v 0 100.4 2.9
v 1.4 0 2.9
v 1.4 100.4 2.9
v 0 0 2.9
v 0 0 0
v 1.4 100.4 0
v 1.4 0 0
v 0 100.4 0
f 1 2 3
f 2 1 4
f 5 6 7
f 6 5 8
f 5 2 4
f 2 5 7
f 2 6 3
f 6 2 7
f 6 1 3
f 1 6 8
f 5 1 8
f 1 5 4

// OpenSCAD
function ZipTieWidth(3dPrinterTolerance=.4)=2.5+3dPrinterTolerance;
function ZipTieHeight(3dPrinterTolerance=.4)=1+3dPrinterTolerance;
function ZipTieLength(3dPrinterTolerance=.4)=100+3dPrinterTolerance;

module ZipTie(3dPrinterTolerance=.4)
{
	cube([ZipTieHeight(3dPrinterTolerance),ZipTieLength(3dPrinterTolerance), ZipTieWidth(3dPrinterTolerance)]);
}

ZipTie();
